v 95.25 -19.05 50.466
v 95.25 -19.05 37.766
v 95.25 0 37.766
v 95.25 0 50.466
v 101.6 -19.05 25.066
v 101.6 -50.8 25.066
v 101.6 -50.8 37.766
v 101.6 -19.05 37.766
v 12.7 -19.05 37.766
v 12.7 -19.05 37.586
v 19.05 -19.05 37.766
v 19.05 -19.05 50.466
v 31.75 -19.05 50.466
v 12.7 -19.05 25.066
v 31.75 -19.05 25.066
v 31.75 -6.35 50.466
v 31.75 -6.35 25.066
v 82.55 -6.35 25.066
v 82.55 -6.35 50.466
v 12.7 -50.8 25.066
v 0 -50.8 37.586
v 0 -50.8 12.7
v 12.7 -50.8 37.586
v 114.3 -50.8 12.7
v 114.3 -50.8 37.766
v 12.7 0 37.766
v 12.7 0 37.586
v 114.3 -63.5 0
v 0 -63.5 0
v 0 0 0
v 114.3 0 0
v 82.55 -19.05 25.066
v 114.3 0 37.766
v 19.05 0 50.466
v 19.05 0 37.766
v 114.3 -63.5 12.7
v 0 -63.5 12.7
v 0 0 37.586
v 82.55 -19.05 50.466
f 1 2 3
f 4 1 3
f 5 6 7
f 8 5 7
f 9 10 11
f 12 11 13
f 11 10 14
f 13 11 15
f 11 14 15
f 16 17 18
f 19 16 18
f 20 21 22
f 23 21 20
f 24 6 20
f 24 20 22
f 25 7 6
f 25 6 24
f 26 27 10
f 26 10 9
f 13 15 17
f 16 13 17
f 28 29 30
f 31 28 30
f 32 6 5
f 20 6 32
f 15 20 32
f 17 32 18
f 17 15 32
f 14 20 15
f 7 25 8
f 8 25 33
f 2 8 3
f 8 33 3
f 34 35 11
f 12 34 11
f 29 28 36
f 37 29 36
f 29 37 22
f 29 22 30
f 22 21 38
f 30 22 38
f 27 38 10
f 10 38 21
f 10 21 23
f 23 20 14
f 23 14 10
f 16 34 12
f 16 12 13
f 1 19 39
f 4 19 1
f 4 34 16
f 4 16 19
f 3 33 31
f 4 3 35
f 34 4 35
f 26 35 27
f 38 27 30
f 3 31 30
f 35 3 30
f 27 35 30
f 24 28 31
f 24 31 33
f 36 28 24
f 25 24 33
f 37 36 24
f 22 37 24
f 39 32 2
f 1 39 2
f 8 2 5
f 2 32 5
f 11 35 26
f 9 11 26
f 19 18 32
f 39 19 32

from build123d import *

# Parameters (mm, degrees)
F0_W      = 63.5
F0_H      = 12.7
F1_DEPTH  = 114.3
F2_W      = 50.8
F2_H      = 12.7
F3_DEPTH  = 114.3
F6_W      = 12.7
F6_H      = 12.7
F7_DEPTH  = 50.8
F8_W      = 12.7
F8_H      = 12.7
F9_DEPTH  = 50.8
F10_W     = 6.35
F10_H     = 12.7
F11_DEPTH = 19.05
F12_DEPTH = 19.05
F13_W     = 50.8
F13_H     = 6.35
F14_DEPTH = 25.4


with BuildPart() as f1:
    # F0 (on Right) → F1 (new body)
    with BuildSketch(Plane.YZ):
        with Locations((-31.75, 6.35)):
            Rectangle(F0_W, F0_H)
    extrude(amount=F1_DEPTH)

    # F2 (on Right) → F3 (join)
    with BuildSketch(Plane.YZ):
        with Locations((-25.4, 18.7161865272)):
            Rectangle(F2_W, F2_H)
    extrude(amount=F3_DEPTH)

    # F6 (on offset) → F7 (join)
    with BuildSketch(Plane.XZ.offset(50.8)):
        with Locations((6.35, 31.2356372522)):
            Rectangle(F6_W, F6_H)
    extrude(amount=-F7_DEPTH)

    # F8 (on face) → F9 (join)
    with BuildSketch(Plane.XZ.offset(50.8)):
        with Locations((107.95, 31.4161865272)):
            Rectangle(F8_W, F8_H)
    extrude(amount=-F9_DEPTH)

    # F10 (on face) → F11 (join)
    with BuildSketch(Plane(origin=(0, 0, 0), x_dir=(-1, 0, 0), z_dir=(0, 1, 0))):
        with Locations((-98.425, 31.4161865272)):
            Rectangle(F10_W, F10_H)
        with Locations((-15.875, 31.4161865272)):
            Rectangle(F10_W, F10_H)
    extrude(amount=-F11_DEPTH)

    # F10 (on face) → F12 (join)
    with BuildSketch(Plane(origin=(0, 0, 0), x_dir=(-1, 0, 0), z_dir=(0, 1, 0))):
        with Locations((-98.425, 31.4161865272)):
            Rectangle(F10_W, F10_H)
        with Locations((-15.875, 31.4161865272)):
            Rectangle(F10_W, F10_H)
    extrude(amount=-F12_DEPTH)

    # F13 (on face) → F14 (join)
    with BuildSketch(Plane.XY.offset(25.0661865272)):
        Polygon((31.75, 0), (19.05, 0), (19.05, -19.05), (31.75, -19.05), (31.75, -6.35), align=None)
        with Locations((57.15, -3.175)):
            Rectangle(F13_W, F13_H)
        Polygon((95.25, 0), (82.55, 0), (82.55, -6.35), (82.55, -19.05), (95.25, -19.05), align=None)
    extrude(amount=F14_DEPTH)


solid = f1.part
